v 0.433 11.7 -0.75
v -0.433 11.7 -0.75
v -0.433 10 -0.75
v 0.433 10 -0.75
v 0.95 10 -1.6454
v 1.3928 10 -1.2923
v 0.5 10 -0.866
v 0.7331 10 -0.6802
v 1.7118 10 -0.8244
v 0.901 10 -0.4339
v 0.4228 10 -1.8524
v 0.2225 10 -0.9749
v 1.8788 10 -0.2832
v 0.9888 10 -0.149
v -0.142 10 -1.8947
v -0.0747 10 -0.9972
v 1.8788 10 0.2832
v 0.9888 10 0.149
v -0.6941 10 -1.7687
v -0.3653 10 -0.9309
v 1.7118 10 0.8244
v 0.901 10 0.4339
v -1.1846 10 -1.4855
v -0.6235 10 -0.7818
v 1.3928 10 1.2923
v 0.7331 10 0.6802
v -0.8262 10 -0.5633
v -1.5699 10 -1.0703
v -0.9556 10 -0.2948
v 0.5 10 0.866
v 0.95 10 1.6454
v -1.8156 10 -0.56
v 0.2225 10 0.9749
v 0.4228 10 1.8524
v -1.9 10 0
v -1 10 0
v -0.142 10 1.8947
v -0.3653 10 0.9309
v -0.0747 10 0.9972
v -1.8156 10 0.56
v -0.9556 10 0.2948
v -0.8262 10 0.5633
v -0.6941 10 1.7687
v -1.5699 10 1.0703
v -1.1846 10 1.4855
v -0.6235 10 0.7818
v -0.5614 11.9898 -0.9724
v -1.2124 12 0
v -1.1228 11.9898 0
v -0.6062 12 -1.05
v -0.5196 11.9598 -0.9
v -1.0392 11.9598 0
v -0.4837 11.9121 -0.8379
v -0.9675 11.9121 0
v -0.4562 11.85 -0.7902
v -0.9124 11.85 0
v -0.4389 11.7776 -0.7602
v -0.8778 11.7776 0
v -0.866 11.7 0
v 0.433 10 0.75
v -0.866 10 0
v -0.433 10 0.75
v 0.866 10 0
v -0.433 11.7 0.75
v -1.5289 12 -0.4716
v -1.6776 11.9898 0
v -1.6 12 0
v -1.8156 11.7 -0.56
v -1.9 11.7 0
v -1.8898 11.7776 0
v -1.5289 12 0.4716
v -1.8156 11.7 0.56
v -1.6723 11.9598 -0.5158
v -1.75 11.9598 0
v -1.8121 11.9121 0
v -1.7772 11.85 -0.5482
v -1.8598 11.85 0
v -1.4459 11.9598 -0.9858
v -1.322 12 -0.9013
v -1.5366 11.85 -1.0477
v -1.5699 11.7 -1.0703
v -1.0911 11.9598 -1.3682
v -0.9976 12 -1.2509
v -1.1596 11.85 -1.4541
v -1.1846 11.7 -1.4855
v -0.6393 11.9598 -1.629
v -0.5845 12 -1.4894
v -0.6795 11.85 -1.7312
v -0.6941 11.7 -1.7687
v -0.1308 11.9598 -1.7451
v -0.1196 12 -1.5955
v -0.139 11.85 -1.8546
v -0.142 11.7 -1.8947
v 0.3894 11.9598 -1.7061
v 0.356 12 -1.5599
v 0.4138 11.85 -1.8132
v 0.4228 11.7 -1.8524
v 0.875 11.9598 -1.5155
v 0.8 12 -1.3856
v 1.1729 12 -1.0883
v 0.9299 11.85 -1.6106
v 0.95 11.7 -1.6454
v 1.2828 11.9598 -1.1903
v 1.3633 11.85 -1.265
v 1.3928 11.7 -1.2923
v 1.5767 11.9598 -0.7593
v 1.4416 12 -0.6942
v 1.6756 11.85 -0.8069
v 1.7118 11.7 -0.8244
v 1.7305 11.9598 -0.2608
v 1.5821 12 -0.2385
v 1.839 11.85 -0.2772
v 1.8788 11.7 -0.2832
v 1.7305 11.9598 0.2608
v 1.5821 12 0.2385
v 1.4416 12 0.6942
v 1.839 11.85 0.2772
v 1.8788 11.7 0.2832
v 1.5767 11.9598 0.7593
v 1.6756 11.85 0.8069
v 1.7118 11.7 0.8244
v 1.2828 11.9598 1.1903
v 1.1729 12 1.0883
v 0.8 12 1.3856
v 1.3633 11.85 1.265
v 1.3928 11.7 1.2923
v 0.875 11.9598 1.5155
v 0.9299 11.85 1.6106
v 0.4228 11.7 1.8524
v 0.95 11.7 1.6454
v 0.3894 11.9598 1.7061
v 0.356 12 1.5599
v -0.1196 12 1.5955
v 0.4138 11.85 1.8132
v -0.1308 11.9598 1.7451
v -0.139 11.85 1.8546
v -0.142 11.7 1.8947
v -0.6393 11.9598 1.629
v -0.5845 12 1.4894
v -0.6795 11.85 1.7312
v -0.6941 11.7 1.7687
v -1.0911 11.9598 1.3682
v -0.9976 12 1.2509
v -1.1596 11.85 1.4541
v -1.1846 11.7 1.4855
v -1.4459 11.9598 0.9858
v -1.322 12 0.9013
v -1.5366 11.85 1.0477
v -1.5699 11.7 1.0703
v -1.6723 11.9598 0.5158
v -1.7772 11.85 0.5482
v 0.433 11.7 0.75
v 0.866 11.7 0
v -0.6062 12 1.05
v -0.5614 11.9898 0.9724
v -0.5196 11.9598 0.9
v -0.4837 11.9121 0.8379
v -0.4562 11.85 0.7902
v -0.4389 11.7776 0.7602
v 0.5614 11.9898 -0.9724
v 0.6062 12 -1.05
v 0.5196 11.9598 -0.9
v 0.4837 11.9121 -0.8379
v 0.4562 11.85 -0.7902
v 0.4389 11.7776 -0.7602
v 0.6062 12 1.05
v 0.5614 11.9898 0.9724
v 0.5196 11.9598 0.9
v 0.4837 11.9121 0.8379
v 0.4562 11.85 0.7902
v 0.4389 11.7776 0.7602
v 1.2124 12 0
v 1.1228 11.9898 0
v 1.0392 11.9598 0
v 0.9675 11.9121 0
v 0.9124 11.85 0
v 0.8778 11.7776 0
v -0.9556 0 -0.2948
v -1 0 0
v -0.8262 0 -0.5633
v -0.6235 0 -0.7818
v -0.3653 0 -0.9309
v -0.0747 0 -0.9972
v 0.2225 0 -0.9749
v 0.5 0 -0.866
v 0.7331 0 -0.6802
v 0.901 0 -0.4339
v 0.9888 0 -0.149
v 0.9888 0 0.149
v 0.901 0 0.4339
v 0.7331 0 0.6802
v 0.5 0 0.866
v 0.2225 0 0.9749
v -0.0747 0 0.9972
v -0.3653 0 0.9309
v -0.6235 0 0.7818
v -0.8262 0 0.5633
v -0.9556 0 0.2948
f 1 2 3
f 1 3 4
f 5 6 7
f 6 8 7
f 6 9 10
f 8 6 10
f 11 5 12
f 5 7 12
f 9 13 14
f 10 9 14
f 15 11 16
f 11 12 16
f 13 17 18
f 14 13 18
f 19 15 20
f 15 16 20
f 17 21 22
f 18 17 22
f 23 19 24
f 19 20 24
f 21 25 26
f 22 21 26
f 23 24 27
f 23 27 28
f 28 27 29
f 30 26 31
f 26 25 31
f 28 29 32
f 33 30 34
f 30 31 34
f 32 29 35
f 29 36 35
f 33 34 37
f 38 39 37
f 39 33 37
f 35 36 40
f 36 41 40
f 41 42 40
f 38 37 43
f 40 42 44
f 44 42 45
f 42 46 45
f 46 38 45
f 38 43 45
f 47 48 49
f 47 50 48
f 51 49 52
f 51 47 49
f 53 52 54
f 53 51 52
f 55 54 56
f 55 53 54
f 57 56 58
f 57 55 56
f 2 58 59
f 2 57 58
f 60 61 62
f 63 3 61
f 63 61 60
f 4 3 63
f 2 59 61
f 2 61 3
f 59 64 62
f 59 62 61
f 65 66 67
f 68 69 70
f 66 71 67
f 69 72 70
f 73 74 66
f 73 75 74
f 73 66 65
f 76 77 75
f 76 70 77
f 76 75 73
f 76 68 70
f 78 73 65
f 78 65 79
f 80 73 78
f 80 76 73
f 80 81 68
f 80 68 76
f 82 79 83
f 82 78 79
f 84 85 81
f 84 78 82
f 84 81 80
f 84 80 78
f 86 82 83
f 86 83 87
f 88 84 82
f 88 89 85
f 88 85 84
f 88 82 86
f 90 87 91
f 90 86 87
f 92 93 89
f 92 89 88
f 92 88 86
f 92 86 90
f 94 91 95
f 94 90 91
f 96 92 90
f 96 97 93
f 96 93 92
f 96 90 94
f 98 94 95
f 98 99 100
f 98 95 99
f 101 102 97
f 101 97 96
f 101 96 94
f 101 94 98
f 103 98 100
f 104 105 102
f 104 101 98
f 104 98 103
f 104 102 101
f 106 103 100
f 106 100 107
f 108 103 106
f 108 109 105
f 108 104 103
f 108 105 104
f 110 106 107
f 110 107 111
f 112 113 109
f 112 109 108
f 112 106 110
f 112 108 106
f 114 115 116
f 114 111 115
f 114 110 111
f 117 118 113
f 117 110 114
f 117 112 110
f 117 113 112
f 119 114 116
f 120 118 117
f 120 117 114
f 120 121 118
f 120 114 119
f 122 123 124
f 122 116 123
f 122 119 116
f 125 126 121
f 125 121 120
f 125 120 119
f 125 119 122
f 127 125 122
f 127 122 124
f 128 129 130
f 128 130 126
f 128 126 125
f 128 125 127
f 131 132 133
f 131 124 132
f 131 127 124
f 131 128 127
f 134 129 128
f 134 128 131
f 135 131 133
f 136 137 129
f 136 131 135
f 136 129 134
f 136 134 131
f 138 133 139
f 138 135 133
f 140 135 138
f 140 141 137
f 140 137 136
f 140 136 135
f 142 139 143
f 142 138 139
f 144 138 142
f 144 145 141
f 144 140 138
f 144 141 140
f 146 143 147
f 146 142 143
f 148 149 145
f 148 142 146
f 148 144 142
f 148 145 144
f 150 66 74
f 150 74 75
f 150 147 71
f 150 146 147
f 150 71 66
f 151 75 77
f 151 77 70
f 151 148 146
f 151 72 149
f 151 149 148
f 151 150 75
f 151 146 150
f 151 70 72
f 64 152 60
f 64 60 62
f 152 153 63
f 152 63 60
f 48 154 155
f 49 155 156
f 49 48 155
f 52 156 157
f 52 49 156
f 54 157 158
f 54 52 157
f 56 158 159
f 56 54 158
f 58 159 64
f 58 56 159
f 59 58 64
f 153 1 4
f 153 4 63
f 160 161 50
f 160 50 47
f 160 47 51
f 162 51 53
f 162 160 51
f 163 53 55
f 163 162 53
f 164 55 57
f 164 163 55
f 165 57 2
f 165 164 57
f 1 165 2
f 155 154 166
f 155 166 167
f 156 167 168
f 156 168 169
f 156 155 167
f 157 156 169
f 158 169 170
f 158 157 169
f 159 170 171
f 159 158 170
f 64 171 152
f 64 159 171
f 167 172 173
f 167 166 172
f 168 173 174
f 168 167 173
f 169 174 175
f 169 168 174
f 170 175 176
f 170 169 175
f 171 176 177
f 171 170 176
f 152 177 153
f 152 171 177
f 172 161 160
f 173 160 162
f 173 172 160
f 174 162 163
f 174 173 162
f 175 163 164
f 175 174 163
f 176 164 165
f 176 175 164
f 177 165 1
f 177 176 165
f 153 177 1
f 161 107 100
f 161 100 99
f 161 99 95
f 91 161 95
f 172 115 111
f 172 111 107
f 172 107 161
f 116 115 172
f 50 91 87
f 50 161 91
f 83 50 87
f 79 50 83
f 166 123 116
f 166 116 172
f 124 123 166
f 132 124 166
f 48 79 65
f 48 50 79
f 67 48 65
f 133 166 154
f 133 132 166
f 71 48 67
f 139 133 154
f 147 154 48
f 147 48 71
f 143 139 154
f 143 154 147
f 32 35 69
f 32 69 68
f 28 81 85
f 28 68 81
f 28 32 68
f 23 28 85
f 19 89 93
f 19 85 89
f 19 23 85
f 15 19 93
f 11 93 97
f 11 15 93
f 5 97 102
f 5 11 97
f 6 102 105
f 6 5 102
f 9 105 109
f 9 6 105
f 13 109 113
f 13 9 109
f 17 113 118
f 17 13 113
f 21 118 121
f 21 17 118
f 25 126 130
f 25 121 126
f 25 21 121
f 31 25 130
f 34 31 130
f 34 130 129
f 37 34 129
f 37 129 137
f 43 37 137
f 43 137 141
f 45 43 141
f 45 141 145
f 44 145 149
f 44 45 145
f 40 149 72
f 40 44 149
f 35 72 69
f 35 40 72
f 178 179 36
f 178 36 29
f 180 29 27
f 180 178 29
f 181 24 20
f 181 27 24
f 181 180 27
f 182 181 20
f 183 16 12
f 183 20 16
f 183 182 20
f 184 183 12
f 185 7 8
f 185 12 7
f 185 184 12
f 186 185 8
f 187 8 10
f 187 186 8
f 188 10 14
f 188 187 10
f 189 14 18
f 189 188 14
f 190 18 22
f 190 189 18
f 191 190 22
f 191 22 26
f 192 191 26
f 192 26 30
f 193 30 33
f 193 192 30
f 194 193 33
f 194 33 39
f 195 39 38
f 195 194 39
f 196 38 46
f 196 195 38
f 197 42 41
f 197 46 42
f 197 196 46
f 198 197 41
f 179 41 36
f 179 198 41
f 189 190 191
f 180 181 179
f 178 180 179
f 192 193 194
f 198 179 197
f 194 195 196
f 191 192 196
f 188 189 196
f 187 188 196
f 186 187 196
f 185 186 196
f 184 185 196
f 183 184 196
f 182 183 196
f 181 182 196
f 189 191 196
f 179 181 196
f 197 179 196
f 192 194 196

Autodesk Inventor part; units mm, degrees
ref_plane "YZ Plane" through (0, 0, 0) normal (1, 0, 0) x (0, 1, 0)
ref_plane "XZ Plane" through (0, 0, 0) normal (0, 1, 0) x (-1, 0, 0)
ref_plane "XY Plane" through (0, 0, 0) normal (0, 0, 1) x (1, 0, 0)
sketch "Sketch1" plane through (0, 0, 0) normal (0, 0, 1) x (1, 0, 0)
  line L0 (0, 0) -> (0, 12)
  line L1 (0, 12) -> (-1.9, 12)
  line L2 (-1.9, 12) -> (-1.9, 10)
  line L3 (-1.9, 10) -> (-1, 10)
  line L4 (-1, 10) -> (-1, 0)
  line L5 (-1, 0) -> (0, 0)
  dimension "d0" = 10
  dimension "d1" = 2
  dimension "d2" = 1
  dimension "d3" = 1.9
revolve "Revolution1" add sketch "Sketch1" angle 360 about axis through (0, 0, 0) along (0, 1, 0)
sketch "Sketch2" plane through (0, 12, 0) normal (0, 1, 0) x (1, 0, 0)
  line L0 (-0.433, -0.75) -> (-0.866, 0)
  line L1 (-0.866, 0) -> (-0.433, 0.75)
  line L2 (-0.433, 0.75) -> (0.433, 0.75)
  line L3 (0.433, 0.75) -> (0.866, 0)
  line L4 (0.866, 0) -> (0.433, -0.75)
  line L5 (0.433, -0.75) -> (-0.433, -0.75)
  point P0 (0, 0)
  point P1 (0, 0)
  dimension "d5" = 1.5
extrude "Extrusion1" cut sketch "Sketch2" against normal blind 2
fillet "Fillet1" radius 0.3 6 edges at (0, 12, -0.75) (0.6495, 12, -0.375) (0.6495, 12, 0.375) (0, 12, 0.75) (-0.6495, 12, 0.375) (-0.6495, 12, -0.375)
fillet "Fillet2" radius 0.3 1 edges at (1.9, 12, 0)
thread "Thread1" size "M2x0.4" class "6g" standard "ANSI Metric M Profile" length 11.5
properties part number "Screw_StainlessSteal_M2_SocketCap_10mm" material "Stainless Steel"
